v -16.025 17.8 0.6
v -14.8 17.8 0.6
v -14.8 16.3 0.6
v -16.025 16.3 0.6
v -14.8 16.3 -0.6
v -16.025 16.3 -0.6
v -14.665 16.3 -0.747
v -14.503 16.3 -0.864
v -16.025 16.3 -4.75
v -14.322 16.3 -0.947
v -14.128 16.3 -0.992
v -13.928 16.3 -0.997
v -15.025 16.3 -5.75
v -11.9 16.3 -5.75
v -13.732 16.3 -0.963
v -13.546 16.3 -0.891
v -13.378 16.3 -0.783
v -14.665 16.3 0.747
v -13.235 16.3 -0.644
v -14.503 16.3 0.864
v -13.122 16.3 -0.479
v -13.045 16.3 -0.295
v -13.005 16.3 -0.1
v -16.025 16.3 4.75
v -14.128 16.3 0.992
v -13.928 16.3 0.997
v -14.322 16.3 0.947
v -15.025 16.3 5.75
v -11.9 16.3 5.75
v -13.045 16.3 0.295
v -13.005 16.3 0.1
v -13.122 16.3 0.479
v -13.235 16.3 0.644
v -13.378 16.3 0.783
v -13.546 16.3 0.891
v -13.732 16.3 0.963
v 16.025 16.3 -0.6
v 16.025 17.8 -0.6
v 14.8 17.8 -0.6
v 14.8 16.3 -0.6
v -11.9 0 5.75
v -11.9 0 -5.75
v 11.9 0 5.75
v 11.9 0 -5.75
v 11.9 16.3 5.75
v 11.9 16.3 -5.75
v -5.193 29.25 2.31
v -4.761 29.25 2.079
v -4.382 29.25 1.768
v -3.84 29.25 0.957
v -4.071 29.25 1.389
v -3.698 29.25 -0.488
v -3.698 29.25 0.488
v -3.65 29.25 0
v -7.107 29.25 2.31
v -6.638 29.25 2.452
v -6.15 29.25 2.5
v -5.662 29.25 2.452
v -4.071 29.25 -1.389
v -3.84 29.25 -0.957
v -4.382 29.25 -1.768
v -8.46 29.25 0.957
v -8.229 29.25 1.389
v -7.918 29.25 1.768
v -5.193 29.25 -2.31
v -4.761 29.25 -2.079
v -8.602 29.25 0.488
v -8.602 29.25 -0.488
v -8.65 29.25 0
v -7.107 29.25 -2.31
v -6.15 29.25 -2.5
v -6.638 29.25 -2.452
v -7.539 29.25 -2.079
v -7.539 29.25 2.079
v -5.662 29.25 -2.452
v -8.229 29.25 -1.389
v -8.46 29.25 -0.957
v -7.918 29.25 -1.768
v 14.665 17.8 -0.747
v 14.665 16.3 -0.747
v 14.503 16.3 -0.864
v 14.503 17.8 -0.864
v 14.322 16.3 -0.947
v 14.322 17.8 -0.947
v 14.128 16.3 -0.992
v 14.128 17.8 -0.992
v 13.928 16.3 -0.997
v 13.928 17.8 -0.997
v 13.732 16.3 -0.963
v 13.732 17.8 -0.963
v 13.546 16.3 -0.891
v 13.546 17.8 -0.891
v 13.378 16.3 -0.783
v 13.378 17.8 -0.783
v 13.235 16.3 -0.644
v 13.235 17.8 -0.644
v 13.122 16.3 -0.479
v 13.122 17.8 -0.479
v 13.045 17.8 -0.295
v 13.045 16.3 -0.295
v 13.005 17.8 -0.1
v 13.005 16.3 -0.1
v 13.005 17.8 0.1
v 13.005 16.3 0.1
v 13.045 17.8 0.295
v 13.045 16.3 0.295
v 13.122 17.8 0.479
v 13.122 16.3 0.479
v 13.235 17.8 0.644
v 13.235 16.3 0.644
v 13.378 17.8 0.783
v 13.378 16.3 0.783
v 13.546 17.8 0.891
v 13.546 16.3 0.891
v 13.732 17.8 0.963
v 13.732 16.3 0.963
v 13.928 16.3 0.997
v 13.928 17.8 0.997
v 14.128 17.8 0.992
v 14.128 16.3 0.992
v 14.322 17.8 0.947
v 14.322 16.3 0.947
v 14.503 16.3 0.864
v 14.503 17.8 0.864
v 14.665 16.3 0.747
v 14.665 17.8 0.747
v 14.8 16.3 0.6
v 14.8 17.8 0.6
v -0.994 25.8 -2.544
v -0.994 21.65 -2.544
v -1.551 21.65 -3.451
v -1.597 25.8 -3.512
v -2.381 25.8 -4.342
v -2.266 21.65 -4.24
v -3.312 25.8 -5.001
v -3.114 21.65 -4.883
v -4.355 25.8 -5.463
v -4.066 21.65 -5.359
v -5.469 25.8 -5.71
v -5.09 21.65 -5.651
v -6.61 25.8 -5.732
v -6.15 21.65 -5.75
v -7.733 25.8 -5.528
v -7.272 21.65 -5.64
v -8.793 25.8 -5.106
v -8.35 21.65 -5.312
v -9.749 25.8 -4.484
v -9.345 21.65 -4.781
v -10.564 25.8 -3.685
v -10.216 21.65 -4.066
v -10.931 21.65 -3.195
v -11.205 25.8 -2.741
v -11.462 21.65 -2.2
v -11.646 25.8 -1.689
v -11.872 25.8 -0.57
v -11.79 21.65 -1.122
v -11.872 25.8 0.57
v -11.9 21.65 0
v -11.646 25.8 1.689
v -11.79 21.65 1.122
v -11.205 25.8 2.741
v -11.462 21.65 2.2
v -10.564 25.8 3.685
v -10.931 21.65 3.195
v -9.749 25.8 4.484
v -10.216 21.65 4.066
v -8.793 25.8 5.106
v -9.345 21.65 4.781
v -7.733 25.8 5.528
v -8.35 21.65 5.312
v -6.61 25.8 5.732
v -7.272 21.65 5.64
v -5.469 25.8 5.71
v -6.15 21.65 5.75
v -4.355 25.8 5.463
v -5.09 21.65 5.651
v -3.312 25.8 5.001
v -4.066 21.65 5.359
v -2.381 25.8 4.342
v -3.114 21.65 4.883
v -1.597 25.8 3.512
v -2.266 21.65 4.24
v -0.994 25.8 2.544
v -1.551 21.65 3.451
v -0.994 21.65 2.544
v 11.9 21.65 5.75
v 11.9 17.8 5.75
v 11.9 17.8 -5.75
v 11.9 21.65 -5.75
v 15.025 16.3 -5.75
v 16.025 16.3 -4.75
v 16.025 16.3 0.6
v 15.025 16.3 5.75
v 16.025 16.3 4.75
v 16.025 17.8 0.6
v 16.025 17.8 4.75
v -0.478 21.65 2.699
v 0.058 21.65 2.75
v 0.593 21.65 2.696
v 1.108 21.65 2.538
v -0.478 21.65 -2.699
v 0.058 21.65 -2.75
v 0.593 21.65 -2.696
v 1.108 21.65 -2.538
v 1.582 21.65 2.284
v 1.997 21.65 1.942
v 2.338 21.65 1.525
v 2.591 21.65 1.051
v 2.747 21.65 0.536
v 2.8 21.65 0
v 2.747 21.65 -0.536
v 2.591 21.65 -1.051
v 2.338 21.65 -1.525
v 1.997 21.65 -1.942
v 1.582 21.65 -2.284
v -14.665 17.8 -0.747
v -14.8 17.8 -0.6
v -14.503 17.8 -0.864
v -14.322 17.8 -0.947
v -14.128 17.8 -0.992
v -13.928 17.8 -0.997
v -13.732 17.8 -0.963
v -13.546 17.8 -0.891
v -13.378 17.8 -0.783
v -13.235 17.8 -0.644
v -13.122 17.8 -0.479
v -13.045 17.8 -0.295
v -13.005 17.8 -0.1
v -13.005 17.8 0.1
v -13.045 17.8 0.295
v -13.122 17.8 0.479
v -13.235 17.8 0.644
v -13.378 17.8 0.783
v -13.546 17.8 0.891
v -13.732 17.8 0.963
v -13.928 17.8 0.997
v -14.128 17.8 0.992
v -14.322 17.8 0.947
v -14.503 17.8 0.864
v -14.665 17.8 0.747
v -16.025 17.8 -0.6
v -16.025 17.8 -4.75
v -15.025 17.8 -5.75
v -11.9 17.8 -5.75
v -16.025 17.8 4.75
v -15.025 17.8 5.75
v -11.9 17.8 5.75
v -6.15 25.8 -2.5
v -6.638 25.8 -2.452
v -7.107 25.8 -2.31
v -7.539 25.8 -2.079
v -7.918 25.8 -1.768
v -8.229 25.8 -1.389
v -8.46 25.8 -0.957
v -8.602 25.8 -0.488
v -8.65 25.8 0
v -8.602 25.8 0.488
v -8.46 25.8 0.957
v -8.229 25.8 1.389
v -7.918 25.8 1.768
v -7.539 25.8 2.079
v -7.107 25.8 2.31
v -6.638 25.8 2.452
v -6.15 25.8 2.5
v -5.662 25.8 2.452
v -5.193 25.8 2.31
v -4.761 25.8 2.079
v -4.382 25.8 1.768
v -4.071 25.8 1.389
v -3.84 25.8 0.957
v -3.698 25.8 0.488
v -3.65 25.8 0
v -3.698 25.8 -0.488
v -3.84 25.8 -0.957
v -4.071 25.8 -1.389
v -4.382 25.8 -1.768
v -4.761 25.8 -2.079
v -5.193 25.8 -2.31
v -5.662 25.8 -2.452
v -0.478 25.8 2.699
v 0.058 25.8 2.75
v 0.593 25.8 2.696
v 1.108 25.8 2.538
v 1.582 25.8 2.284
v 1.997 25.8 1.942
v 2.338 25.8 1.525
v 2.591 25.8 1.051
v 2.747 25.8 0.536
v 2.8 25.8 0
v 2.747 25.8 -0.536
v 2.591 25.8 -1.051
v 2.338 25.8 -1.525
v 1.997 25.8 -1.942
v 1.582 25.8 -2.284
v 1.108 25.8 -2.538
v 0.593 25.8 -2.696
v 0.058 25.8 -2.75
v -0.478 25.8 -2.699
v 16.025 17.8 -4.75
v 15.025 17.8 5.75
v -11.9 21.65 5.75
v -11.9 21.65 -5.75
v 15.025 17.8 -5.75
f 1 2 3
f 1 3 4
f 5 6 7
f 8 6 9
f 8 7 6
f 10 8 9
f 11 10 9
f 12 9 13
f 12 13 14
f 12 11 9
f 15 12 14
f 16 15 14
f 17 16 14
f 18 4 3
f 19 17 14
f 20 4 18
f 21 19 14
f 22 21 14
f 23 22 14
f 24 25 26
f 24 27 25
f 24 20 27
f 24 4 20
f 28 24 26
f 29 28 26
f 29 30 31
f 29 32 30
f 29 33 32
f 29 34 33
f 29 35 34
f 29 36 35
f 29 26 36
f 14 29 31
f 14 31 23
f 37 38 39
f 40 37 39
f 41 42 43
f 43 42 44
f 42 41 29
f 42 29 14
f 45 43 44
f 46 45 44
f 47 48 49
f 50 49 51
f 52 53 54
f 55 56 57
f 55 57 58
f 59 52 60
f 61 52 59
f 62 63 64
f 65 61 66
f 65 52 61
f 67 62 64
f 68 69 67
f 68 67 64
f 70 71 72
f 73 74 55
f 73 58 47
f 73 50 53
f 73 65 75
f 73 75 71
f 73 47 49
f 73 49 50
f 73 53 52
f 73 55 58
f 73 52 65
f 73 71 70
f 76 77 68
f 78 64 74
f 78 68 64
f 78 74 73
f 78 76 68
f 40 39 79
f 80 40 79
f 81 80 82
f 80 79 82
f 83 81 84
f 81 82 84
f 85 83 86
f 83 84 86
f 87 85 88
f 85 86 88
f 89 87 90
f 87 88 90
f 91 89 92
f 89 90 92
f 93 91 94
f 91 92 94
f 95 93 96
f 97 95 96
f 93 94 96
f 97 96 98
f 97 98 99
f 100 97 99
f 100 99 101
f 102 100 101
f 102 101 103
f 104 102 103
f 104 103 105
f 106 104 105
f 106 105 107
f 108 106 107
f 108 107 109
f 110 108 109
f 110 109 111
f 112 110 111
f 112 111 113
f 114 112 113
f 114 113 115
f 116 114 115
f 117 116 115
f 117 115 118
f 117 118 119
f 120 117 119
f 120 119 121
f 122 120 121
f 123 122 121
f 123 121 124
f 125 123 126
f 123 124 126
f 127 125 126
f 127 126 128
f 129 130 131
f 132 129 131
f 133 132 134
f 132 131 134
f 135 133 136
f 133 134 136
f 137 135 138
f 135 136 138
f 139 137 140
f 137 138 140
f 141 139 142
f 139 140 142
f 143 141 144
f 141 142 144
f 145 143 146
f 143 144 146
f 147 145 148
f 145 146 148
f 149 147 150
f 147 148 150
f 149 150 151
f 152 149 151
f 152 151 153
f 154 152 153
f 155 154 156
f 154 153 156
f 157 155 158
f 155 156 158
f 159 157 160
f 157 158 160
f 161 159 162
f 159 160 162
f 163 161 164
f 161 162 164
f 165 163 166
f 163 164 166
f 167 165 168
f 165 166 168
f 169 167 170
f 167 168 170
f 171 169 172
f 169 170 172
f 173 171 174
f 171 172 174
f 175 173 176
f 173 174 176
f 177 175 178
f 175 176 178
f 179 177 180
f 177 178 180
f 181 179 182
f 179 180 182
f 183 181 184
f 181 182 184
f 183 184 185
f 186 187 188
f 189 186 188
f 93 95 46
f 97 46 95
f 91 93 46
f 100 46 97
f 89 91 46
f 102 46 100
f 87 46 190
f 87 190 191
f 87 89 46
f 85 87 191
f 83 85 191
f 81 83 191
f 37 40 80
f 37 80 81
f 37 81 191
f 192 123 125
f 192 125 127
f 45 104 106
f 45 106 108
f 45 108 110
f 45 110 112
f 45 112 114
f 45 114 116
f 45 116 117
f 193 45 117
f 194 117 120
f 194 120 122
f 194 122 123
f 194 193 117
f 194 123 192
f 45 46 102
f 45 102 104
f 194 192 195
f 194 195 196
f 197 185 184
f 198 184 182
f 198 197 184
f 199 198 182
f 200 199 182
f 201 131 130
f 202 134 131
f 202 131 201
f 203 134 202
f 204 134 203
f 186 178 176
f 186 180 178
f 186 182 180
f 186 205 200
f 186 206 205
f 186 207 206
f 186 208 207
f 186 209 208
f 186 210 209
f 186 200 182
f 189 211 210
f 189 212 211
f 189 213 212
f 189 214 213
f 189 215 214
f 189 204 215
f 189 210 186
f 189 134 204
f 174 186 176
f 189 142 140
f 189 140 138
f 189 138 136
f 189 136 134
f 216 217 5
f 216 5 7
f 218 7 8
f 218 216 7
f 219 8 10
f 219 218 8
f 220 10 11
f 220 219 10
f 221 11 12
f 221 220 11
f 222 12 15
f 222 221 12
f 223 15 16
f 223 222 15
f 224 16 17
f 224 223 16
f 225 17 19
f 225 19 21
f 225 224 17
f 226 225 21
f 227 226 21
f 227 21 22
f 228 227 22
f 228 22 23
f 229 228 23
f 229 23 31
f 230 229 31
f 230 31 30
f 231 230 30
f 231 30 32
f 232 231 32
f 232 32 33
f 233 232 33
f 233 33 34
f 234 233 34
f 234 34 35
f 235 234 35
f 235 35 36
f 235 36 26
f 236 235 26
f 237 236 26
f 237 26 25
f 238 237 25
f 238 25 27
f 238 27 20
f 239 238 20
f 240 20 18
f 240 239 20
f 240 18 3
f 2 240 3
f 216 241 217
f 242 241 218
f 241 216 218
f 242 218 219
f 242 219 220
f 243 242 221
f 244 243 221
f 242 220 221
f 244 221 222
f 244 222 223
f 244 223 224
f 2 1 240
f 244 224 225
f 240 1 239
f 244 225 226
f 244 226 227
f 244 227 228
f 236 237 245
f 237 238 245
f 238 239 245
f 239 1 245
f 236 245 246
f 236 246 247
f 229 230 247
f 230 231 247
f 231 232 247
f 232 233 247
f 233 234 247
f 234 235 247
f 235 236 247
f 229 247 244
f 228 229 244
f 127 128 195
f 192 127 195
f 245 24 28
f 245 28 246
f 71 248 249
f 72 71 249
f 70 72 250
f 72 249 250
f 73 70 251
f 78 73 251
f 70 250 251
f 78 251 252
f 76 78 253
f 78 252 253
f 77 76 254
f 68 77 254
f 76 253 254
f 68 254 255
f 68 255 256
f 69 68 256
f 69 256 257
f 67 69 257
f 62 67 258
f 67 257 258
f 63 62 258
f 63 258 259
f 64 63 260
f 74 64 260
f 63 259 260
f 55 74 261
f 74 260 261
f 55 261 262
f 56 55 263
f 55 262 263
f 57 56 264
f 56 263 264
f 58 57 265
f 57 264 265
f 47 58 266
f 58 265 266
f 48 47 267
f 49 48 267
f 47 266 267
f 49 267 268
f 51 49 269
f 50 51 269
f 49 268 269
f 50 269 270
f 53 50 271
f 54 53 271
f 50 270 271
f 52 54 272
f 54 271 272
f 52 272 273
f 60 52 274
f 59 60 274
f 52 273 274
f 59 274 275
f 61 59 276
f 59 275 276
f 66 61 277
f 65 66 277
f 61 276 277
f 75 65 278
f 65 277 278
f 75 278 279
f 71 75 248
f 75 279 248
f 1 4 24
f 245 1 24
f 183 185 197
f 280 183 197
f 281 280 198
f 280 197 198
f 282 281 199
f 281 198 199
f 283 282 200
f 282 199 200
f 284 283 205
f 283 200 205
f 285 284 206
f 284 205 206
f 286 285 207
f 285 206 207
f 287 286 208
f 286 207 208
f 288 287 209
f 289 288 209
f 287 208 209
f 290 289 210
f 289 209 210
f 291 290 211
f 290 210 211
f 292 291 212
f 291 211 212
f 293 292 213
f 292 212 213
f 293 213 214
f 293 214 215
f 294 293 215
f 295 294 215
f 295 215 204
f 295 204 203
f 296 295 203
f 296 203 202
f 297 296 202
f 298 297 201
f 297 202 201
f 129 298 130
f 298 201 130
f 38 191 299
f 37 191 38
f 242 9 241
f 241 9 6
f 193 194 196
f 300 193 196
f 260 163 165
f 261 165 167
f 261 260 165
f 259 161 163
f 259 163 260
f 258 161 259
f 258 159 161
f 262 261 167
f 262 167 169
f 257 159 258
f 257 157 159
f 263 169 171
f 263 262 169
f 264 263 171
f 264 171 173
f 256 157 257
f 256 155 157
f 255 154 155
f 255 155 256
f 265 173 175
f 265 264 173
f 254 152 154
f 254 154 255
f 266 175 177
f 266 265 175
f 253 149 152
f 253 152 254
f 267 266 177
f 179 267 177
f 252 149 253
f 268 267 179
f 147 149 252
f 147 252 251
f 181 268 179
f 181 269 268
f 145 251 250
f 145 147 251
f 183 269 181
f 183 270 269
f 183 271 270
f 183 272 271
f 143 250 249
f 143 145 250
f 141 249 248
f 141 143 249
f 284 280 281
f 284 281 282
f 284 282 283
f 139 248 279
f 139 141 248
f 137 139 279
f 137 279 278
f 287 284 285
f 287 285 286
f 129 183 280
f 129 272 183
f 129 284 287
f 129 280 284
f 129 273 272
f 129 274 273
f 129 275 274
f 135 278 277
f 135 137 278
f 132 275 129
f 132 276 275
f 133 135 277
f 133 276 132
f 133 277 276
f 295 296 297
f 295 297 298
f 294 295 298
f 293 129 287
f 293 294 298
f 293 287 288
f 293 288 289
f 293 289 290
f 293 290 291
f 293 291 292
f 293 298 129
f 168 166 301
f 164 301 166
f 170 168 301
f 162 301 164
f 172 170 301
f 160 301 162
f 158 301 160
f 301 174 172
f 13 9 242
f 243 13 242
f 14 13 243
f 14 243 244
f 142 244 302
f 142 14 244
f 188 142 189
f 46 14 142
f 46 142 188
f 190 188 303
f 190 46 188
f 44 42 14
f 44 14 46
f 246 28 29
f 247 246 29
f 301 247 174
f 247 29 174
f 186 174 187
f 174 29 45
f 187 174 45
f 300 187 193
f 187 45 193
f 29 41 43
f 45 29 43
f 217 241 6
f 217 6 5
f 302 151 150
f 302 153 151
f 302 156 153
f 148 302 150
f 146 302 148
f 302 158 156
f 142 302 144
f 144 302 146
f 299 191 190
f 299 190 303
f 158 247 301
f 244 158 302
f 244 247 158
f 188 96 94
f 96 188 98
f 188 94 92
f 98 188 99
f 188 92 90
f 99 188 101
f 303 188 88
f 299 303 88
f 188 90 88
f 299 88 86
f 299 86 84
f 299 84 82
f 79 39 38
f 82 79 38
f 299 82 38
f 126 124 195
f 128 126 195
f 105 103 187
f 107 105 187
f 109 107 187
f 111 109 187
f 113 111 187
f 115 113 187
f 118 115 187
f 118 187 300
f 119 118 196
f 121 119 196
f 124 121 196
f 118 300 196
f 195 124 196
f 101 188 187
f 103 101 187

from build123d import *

# Parameters (mm, degrees)
SKETCH_1_W          = 23.8
SKETCH_1_H          = 11.5
EXTRUDE_1_DEPTH     = 21.65
EXTRUDE_START       = -16.3
SKETCH_2_W          = 32.05
SKETCH_2_H          = 11.5
EXTRUDE_2_DEPTH     = 1.5
SKETCH_3_R          = 2.75
SKETCH_3_R_2        = 5.75
EXTRUDE_3_DEPTH     = 4.15
SKETCH_4_R          = 2.5
EXTRUDE_4_DEPTH     = 3.45
CHAMFER_1_SIZE      = 1
CUT_EXTRUDE_1_REACH = 26.631
SKETCH_5_R          = 1


with BuildPart() as part:
    # 草图1 → 凸台-拉伸1 (new body)
    with BuildSketch(Plane(origin=(0, 0, 0), x_dir=(1, 0, 0), z_dir=(0, 1, 0))):
        Rectangle(SKETCH_1_W, SKETCH_1_H)
    extrude(amount=EXTRUDE_1_DEPTH)

    # 草图2 → 凸台-拉伸2 (add)
    with BuildSketch(Plane.XZ.offset(EXTRUDE_START)):
        Rectangle(SKETCH_2_W, SKETCH_2_H)
    extrude(amount=-EXTRUDE_2_DEPTH)

    # 草图3 → 凸台-拉伸3 (add)
    with BuildSketch(Plane(origin=(0, 21.65, 0), x_dir=(1, 0, 0), z_dir=(0, 1, 0))):
        with Locations((0.05, 0)):
            Circle(SKETCH_3_R)
        with Locations((-6.15, 0)):
            Circle(SKETCH_3_R_2)
    extrude(amount=EXTRUDE_3_DEPTH)

    # 草图4 → 凸台-拉伸4 (add)
    with BuildSketch(Plane(origin=(0, 25.8, 0), x_dir=(1, 0, 0), z_dir=(0, 1, 0))):
        with Locations(Location((-6.15, 0, 0), (0, 0, 90))):
            Circle(SKETCH_4_R)
    extrude(amount=EXTRUDE_4_DEPTH)

    # 倒角1
    chamfer_1_edges = [part.edges().sort_by_distance(p)[0] for p in [
        (-16.025, 17.05, 5.75),
        (16.025, 17.05, -5.75),
        (-16.025, 17.05, -5.75),
        (16.025, 17.05, 5.75),
    ]]
    chamfer(chamfer_1_edges, length=CHAMFER_1_SIZE)

    # 草图5 → 切除-拉伸1 (cut, up to next)
    with BuildSketch(Plane(origin=(0, 17.8, 0), x_dir=(1, 0, 0), z_dir=(0, 1, 0)), mode=Mode.PRIVATE) as cut_extrude_1_sk1:
        with Locations((14, 0)):
            Circle(SKETCH_5_R)
    cut_extrude_1_tool1 = extrude(cut_extrude_1_sk1.sketch, amount=-CUT_EXTRUDE_1_REACH, mode=Mode.PRIVATE) & part.part
    # 草图5 → 切除-拉伸1 (cut, up to next)
    with BuildSketch(Plane(origin=(0, 17.8, 0), x_dir=(1, 0, 0), z_dir=(0, 1, 0)), mode=Mode.PRIVATE) as cut_extrude_1_sk2:
        with BuildLine():
            Line((16.025, -0.6), (16.025, 0.6))
            Line((16.025, 0.6), (14.8, 0.6))
            ThreePointArc((14.8, 0.6), (14.948683298, 0.316227766), (15, 0))
            ThreePointArc((15, 0), (14.948683298, -0.316227766), (14.8, -0.6))
            Line((14.8, -0.6), (16.025, -0.6))
        make_face()
    cut_extrude_1_tool2 = extrude(cut_extrude_1_sk2.sketch, amount=-CUT_EXTRUDE_1_REACH, mode=Mode.PRIVATE) & part.part
    cut_extrude_1_1 = cut_extrude_1_tool1.solids().sort_by_distance((14, 17.8, 0))[0]
    add(cut_extrude_1_1, mode=Mode.SUBTRACT)
    cut_extrude_1_2 = cut_extrude_1_tool2.solids().sort_by_distance((15.479048, 17.8, 0))[0]
    add(cut_extrude_1_2, mode=Mode.SUBTRACT)
    cut_extrude_1 = cut_extrude_1_1 + cut_extrude_1_2  # 切除-拉伸1 as one shape, for the pattern or mirror that repeats it

    # 镜向1: 切除-拉伸1 across plane
    add(cut_extrude_1.mirror(Plane(origin=(0, 0, 0), x_dir=(0, 0, 1), z_dir=(1, 0, 0))), mode=Mode.SUBTRACT)


solid = part.part
